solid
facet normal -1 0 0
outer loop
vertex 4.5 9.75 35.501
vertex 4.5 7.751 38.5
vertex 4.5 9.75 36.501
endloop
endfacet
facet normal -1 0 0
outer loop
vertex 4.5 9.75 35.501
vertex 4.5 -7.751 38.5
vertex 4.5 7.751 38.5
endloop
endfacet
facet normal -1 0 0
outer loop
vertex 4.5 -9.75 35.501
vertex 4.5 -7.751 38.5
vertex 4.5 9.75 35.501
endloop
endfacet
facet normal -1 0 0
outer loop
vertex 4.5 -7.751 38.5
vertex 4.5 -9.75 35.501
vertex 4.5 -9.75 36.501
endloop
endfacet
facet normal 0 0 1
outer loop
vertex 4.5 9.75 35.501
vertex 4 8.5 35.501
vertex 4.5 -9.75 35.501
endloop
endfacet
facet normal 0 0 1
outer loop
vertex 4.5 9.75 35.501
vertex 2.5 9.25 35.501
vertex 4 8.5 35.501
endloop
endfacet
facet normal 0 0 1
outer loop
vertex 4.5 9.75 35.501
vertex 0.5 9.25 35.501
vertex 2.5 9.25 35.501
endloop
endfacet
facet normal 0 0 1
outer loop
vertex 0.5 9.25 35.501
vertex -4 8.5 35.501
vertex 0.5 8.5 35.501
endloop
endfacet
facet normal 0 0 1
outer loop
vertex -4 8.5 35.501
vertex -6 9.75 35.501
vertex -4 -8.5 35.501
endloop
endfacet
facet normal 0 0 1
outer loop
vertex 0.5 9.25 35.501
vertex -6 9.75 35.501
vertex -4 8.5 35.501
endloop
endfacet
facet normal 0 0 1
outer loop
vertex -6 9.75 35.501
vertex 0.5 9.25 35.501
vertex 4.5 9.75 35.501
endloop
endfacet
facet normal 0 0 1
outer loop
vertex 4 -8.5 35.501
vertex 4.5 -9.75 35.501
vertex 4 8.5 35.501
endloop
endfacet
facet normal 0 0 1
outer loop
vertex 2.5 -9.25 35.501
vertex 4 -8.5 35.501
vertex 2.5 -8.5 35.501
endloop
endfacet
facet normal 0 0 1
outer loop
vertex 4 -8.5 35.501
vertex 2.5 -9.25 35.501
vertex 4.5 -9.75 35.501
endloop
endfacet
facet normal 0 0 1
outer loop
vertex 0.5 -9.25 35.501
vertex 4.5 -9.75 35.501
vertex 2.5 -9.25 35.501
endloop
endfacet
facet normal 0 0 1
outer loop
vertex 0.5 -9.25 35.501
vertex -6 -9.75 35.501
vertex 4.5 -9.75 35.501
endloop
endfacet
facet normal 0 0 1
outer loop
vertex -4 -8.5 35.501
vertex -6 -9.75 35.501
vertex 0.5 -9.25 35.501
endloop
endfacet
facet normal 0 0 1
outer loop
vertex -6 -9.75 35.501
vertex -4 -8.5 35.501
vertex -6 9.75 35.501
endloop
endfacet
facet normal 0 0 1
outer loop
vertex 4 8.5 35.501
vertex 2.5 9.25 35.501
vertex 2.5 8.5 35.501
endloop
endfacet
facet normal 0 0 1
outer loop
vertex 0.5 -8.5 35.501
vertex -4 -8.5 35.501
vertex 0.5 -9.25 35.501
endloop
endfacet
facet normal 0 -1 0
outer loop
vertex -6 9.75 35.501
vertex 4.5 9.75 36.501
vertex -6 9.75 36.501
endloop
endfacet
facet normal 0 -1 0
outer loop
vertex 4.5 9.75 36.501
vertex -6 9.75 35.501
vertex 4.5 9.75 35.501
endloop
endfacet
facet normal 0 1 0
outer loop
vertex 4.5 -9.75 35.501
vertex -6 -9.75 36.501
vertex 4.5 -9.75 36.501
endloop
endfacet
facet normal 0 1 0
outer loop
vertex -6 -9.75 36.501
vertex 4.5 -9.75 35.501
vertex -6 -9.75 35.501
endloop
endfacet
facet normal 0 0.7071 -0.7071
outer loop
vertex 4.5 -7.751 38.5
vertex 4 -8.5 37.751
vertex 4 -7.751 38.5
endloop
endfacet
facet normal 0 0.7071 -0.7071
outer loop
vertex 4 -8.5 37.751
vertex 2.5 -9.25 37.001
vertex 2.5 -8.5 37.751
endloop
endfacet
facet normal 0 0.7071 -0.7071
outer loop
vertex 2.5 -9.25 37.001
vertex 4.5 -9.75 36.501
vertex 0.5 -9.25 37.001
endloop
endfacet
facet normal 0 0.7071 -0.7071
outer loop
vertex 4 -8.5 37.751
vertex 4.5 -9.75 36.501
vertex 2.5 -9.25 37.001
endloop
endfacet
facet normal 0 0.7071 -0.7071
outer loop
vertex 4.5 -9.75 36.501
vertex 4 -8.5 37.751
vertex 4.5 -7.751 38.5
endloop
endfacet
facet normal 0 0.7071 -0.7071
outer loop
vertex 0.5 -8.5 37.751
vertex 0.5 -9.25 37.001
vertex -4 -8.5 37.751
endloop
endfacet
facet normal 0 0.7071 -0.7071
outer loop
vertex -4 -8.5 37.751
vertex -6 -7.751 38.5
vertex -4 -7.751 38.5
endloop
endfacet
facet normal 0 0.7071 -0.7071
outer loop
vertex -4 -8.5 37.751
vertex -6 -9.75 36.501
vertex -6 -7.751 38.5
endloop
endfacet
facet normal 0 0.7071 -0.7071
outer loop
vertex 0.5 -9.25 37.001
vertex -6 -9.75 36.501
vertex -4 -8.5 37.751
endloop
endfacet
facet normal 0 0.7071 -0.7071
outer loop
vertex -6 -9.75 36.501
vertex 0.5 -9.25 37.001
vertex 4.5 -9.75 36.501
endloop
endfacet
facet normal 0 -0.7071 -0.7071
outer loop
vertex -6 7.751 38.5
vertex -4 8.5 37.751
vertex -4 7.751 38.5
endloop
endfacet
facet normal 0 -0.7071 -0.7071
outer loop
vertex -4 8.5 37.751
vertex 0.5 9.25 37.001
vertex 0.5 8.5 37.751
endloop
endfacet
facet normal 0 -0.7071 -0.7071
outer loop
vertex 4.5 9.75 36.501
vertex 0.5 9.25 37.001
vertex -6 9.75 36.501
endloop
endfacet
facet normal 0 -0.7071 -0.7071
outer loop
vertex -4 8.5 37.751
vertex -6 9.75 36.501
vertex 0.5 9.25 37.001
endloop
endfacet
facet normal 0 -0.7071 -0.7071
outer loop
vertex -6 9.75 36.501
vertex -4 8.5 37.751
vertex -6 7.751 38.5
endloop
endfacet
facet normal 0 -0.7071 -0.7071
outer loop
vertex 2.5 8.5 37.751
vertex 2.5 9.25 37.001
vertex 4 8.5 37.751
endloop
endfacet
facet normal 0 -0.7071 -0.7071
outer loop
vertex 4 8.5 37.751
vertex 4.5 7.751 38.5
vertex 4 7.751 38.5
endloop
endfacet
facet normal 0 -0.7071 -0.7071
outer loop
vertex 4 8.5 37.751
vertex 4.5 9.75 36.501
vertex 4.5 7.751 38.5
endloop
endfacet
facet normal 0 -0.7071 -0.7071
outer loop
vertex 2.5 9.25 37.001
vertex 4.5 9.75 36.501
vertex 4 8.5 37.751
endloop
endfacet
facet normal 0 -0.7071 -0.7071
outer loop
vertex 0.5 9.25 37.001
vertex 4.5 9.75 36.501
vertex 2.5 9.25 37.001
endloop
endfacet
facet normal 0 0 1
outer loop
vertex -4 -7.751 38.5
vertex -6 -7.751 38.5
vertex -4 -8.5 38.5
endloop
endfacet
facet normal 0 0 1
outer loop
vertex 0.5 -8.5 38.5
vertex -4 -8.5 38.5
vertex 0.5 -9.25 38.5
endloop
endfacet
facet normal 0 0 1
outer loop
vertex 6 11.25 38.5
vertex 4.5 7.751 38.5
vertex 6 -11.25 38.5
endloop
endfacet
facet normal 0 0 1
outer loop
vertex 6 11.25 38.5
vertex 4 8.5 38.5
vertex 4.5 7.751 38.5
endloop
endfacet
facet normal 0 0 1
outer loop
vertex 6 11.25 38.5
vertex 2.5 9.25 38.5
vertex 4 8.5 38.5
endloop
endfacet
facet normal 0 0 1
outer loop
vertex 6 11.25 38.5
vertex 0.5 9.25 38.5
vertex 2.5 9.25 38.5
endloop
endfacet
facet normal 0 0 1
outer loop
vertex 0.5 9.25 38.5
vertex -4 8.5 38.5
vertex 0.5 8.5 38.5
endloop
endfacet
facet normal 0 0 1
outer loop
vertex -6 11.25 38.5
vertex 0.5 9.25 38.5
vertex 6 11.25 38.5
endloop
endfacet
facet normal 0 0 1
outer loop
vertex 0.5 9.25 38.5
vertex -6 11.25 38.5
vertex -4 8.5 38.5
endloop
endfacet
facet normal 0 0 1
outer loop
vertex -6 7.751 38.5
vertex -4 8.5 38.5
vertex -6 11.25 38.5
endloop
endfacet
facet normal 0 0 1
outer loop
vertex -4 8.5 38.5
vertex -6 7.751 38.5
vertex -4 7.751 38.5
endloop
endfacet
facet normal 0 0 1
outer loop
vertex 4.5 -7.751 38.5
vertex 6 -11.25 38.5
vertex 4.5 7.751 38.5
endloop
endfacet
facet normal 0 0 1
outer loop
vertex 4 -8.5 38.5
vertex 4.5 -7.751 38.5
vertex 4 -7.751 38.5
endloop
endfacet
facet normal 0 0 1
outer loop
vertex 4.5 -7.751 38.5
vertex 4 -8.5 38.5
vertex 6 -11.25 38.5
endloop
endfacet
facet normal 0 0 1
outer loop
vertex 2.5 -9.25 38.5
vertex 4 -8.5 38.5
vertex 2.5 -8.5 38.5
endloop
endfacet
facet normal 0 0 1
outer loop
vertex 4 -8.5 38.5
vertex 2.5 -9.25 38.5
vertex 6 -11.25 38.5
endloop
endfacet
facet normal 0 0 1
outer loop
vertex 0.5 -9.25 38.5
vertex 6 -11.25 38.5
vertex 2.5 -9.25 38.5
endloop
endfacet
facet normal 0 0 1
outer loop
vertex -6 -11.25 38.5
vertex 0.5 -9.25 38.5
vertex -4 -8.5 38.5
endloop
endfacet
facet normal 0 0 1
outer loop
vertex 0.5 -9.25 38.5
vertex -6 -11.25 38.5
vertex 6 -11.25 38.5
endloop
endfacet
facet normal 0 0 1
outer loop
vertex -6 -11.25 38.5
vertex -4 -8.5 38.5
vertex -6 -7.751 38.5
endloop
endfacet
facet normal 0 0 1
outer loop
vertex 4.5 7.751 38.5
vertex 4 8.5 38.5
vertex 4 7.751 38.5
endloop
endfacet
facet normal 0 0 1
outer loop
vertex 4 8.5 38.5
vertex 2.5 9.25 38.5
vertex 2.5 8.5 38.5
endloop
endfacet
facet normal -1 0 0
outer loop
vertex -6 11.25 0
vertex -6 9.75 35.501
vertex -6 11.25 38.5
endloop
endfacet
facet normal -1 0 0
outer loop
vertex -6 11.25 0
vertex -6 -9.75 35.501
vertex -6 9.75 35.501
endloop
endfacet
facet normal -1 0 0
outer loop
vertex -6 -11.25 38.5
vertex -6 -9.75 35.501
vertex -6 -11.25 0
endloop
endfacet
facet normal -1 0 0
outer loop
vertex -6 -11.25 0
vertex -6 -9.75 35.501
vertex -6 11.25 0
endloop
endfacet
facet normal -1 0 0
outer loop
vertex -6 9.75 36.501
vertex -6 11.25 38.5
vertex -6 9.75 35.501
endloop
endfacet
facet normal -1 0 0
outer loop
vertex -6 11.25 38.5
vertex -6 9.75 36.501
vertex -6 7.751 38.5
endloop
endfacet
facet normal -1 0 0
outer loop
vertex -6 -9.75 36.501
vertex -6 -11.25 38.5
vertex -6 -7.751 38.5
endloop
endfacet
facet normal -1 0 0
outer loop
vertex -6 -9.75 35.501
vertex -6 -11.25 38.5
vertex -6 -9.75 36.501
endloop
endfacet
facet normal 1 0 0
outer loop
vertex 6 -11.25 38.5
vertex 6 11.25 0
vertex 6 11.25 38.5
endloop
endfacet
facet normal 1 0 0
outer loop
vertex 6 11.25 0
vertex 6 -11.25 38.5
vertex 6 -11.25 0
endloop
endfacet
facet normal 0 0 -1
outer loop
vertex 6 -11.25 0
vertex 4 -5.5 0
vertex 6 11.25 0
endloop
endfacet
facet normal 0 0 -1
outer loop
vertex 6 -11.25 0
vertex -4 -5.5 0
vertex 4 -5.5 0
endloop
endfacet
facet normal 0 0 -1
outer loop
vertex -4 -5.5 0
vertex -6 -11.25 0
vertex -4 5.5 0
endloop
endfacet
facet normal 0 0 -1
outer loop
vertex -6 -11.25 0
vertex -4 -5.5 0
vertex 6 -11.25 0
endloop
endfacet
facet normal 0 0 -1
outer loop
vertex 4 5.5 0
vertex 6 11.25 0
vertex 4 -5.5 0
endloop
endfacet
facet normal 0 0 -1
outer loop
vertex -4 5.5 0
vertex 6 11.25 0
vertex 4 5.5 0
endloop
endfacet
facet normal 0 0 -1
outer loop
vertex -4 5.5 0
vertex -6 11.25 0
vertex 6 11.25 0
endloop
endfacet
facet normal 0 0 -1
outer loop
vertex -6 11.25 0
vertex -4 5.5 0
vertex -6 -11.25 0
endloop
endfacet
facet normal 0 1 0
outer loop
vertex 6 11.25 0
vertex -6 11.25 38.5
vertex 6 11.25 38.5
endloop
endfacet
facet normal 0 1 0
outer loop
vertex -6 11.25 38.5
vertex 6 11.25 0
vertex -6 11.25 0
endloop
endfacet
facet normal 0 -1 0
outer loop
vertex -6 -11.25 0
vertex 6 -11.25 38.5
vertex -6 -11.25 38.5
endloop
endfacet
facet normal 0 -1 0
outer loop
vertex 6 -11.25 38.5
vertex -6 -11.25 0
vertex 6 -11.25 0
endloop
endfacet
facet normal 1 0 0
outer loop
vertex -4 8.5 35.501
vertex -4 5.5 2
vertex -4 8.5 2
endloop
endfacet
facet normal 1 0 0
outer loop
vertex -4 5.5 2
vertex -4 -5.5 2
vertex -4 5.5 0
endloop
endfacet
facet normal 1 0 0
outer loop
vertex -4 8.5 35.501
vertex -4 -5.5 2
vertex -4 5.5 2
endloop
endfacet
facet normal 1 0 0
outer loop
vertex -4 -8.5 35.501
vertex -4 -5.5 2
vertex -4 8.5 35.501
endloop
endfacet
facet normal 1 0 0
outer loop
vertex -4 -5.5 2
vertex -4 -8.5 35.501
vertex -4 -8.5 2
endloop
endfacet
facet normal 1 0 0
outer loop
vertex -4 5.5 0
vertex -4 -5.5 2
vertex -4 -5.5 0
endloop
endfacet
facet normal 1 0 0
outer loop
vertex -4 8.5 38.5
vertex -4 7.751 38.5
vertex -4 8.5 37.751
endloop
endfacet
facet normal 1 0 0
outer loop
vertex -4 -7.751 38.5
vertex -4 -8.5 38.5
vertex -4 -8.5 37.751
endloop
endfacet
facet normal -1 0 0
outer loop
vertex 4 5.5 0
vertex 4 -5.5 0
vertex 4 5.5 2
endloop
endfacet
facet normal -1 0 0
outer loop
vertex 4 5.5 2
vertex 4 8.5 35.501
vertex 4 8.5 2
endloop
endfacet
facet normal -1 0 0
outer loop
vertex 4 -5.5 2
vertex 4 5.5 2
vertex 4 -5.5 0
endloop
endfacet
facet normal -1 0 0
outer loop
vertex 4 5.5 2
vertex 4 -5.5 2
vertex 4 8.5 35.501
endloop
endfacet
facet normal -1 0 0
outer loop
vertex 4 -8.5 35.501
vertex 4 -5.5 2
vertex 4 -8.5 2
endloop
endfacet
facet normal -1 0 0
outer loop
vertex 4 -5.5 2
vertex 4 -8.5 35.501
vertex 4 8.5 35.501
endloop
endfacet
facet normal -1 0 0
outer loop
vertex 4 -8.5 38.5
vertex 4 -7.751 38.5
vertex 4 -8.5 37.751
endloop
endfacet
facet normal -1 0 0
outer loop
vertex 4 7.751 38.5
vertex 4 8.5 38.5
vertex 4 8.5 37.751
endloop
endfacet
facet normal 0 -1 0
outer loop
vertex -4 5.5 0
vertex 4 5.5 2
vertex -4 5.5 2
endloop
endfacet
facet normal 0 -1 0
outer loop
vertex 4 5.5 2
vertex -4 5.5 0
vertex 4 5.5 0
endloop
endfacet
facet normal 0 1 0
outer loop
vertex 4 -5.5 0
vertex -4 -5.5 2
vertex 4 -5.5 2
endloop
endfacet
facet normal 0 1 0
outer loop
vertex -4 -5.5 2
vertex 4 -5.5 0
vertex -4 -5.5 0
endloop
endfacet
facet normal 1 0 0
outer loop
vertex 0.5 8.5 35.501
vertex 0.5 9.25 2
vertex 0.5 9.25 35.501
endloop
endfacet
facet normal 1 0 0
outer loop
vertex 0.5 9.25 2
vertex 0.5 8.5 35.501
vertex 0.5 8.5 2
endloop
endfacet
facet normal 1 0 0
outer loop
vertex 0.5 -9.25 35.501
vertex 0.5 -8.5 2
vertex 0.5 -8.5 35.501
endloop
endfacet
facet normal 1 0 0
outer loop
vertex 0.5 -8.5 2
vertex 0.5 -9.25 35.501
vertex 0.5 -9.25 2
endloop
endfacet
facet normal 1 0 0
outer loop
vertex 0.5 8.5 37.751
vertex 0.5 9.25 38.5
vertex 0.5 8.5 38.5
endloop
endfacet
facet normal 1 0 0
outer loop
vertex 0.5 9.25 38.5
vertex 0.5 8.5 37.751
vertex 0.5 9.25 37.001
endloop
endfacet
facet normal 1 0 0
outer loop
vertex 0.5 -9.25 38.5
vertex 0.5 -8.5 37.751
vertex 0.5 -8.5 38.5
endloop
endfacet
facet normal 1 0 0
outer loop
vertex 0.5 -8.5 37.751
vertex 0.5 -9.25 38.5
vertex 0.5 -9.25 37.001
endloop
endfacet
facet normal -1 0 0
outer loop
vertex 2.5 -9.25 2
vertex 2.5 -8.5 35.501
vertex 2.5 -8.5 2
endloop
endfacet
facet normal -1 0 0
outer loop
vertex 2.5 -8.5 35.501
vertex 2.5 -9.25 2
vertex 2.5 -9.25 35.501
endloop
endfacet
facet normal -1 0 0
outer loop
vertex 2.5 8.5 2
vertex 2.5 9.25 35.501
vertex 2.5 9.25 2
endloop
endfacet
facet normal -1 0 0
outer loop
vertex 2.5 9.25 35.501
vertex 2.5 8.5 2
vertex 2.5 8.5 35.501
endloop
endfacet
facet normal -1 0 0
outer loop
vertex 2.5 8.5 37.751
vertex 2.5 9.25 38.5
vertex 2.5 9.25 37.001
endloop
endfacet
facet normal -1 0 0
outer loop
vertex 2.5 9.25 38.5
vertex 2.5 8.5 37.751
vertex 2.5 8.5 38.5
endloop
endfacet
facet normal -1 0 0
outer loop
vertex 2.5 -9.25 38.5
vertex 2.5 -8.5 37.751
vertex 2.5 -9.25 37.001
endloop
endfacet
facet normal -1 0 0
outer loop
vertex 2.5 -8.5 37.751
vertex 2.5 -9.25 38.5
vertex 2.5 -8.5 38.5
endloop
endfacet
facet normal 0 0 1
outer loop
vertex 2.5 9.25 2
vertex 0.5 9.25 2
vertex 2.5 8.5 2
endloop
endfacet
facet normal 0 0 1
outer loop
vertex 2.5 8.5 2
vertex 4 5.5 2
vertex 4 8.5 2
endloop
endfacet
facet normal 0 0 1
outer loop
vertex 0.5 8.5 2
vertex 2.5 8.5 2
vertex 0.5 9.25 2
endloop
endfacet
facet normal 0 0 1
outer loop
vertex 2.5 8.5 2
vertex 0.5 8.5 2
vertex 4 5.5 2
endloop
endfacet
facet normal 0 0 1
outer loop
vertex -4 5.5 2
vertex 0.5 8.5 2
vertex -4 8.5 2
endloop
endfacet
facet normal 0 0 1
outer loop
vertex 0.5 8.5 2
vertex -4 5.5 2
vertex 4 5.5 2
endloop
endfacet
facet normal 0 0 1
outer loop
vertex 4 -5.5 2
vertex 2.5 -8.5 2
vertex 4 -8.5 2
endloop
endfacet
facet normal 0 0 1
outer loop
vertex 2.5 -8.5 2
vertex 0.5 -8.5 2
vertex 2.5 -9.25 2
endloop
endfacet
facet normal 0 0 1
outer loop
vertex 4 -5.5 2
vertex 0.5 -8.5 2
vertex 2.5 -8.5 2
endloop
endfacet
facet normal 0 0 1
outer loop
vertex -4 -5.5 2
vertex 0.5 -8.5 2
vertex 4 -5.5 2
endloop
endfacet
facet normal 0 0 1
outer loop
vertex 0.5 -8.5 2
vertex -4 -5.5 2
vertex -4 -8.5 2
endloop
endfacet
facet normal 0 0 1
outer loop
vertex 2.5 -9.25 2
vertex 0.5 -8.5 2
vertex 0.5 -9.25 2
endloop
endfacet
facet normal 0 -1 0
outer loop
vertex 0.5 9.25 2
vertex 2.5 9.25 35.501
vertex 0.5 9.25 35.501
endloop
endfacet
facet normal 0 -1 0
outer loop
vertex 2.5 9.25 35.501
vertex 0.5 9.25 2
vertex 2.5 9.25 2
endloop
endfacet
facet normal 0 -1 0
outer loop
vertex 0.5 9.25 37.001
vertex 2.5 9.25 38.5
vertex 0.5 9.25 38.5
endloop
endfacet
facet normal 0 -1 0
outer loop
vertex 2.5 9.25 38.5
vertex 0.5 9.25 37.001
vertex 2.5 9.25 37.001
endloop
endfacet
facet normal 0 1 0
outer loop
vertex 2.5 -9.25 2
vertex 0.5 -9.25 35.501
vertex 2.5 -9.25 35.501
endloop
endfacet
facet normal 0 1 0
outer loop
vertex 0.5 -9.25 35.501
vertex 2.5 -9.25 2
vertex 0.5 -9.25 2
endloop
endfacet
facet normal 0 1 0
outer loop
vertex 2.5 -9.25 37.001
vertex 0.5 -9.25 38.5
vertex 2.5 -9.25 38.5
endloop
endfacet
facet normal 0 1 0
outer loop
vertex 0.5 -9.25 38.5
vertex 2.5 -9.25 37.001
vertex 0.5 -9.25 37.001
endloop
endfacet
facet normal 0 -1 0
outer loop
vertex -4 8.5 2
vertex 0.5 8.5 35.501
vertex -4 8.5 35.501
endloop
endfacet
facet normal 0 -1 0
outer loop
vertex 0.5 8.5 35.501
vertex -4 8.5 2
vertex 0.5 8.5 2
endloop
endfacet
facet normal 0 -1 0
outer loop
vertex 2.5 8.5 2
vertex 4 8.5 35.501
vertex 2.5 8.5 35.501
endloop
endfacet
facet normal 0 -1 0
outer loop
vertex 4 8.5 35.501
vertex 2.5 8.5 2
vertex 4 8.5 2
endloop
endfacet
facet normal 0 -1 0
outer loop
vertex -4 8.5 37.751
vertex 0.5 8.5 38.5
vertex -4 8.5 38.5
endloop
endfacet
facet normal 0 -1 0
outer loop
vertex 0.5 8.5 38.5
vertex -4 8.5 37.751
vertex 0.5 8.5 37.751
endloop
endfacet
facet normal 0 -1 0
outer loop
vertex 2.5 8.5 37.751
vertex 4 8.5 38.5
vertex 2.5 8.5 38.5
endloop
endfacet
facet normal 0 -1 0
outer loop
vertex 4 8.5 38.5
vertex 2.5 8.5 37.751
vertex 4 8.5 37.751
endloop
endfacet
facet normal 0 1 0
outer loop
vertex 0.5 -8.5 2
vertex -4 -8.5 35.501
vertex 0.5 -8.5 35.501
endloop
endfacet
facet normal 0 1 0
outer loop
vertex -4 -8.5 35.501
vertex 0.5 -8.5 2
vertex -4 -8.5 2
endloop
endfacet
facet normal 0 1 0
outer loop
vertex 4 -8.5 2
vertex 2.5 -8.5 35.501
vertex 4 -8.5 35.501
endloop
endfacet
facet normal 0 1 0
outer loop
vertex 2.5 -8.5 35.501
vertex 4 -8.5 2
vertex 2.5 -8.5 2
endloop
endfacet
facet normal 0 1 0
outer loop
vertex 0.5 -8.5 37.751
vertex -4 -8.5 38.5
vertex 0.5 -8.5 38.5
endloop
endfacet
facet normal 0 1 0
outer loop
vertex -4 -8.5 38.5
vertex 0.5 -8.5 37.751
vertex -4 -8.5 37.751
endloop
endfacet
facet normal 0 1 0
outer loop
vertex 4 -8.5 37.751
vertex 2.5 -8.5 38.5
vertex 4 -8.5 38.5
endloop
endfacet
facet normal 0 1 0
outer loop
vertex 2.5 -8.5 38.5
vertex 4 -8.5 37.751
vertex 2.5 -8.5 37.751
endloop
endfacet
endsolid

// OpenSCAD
// Which one would you like to see?
part = "case"; // [case:the case without cap,cap:the cap for the case]

// The width of the (e. g. Arduino) board which should fit into the case (all parameters are in mm)
board_width = 18.5;


// The length of the (e. g. Arduino) board which should fit into the case
board_length = 33.5;

// The thickness of the (e. g. Arduino) board which should fit into the case, must be >= 0. (its used for the thickness of the slots, it is not the size of the inner space
board_thickness = 2.0;

// the board can slide into the case. Therefore there are slots on both sides of the case. If you want the complete inner of the case with same width as above given board with: set this parameter to 0
board_slot_depth = .75;

// if the board should not be centered in the case, you can add an offset here. Positive values give a lower position of the slots
board_out_of_center_Z = 1.5;



// the inner height of the case
case_inner_height = 8;

// on the front there is a centered opening. Typically this is used for connecting the usb conncetor of the board. Set to 0 if you don't need a openening there
USB_openening_height = 8;
USB_openening_width = 11;



// the cap is made a little bit smaller and thinner than the cap slot in the case, must be >= 0 (in mm)
gap = 0.2;

// in the cap there is a slot, e. g. for passing a wire through the cap. Set it to 0 if you do not need a slot
cap_Gap_width =1.7;

// the height is measured above the board in the case. The slot ends at the lower end of the cap
cap_gap_height = 3; 


module dummy() {
    //end of configurable section of customizer
}

houseTS = 2;
houseTT = 2;
capT = 3;
capSkewed = 2;
capWT = 1.5;


houseL = board_length + houseTT + capT;
houseW = board_width + 2 * houseTS;
houseH = case_inner_height + 2 * houseTS;

module mycube(pos,center=[false,false,false])
{   
    translate([center[0]?-pos[0]/2:0,center[1]?-pos[1]/2:0,center[2]?-pos[2]/2:0])cube(pos);
}


module cap(gap = 0) {
    difference() {
        union() {
            translate([0,0,(houseTS-.5)/2+(gap==0?1:0)]) intersection() {
                mycube([capT,houseW-2*capWT-2*gap,case_inner_height+.5+houseTS+2*(gap==0?1:0)],[false,true,true]) ;
                rotate([45,0,0]) rotate([0,90,0]) cylinder(capT-gap,sqrt(2)*(houseW/2-capWT+capT-capSkewed-gap),sqrt(2)*(houseW/2-capWT-capSkewed-gap),$fn=4); 
            }
        }
        if(gap!=0) translate([0,0,-case_inner_height-board_out_of_center_Z/2+cap_gap_height])mycube([capT+2,cap_Gap_width,case_inner_height],[false,true,false]);
    }
}


PartIsCap = (part == "cap");

rotate([0,-90,0]) if(!PartIsCap)
difference() {
    mycube([houseL,houseW,houseH],[false,true,true]);
    translate([-1,0,0]) mycube([2+houseTS,USB_openening_width,USB_openening_height],[false,true,true]);
    translate([houseTS,0,-board_out_of_center_Z]) mycube([houseL,board_width,board_thickness],[false,true,true]);
    translate([houseTS,0,0])mycube([houseL,board_width-2*board_slot_depth,case_inner_height],[false,true,true]);
    translate([houseTT+board_length+0.001,0,0]) cap(0);
}
else
    translate([-15,0,0]) cap(.2);
